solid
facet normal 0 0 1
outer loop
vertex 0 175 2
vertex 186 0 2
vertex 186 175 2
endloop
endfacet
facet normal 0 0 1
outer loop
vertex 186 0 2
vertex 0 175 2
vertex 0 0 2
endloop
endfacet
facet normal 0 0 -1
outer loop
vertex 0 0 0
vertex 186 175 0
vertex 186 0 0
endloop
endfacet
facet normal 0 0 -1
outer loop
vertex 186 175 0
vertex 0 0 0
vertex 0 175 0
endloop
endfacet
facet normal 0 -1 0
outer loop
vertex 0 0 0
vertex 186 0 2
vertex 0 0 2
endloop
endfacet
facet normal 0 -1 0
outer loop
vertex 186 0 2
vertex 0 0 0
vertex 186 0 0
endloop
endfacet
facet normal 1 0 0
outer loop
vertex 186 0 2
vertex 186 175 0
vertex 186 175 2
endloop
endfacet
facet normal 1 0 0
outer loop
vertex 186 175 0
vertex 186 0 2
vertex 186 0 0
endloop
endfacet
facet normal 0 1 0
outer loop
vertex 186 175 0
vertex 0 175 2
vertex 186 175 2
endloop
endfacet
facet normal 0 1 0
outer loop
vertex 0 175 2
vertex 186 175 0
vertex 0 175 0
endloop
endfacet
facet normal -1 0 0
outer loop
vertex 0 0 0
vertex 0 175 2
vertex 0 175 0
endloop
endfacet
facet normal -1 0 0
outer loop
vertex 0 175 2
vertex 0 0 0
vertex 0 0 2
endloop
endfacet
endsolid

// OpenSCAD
/* This piece was designed by Shawn French (McMaster University, Ontario, Canada)
It is part of the SCIFIcube (SCIentific Fluorescence Imaging cube), a small and portable 3D-printed
fluorescence imager for bacteria, yeast, or any colony-forming organism.  It works well with solid
agar medium, and can image high density samples rapidly over time.  

Details can be found at https://www.github.com/sfrench007/scificube

Copyright 2017 McMaster University

Redistribution and use in source and binary forms, with or without modification, are permitted provided that the following conditions are met:

1. Redistributions of source code must retain the above copyright notice, this list of conditions and the following disclaimer.

2. Redistributions in binary form must reproduce the above copyright notice, this list of conditions and the following disclaimer in the documentation and/or other materials provided with the distribution.

3. Neither the name of the copyright holder nor the names of its contributors may be used to endorse or promote products derived from this software without specific prior written permission.

THIS SOFTWARE IS PROVIDED BY THE COPYRIGHT HOLDERS AND CONTRIBUTORS "AS IS" AND ANY EXPRESS OR IMPLIED WARRANTIES, INCLUDING, BUT NOT LIMITED TO, THE IMPLIED WARRANTIES OF MERCHANTABILITY AND FITNESS FOR A PARTICULAR PURPOSE ARE DISCLAIMED. IN NO EVENT SHALL THE COPYRIGHT HOLDER OR CONTRIBUTORS BE LIABLE FOR ANY DIRECT, INDIRECT, INCIDENTAL, SPECIAL, EXEMPLARY, OR CONSEQUENTIAL DAMAGES (INCLUDING, BUT NOT LIMITED TO, PROCUREMENT OF SUBSTITUTE GOODS OR SERVICES; LOSS OF USE, DATA, OR PROFITS; OR BUSINESS INTERRUPTION) HOWEVER CAUSED AND ON ANY THEORY OF LIABILITY, WHETHER IN CONTRACT, STRICT LIABILITY, OR TORT (INCLUDING NEGLIGENCE OR OTHERWISE) ARISING IN ANY WAY OUT OF THE USE OF THIS SOFTWARE, EVEN IF ADVISED OF THE POSSIBILITY OF SUCH DAMAGE.

*/

// Height 175 mm (camera to base)
// Width 157 mm
// Depth 134 mm
// 135 mm camera to top of transilluminator
// 40 mm transilluminator height (base height)

boardWidth = 147;
boardDepth = 115;
boardHeight = 2;
acWidth = 11.5;
acHeight = 9;
acOffset = 5;
acRad = (acHeight/2)+1;
switchWidth = 11;
switchHeight = 7;
switchOffset = 3.5;

transDepth = 126.5;
transWidth = 157.5;
transHeight = 40;
transWallWidth = (transWidth-boardWidth)/2;

rigWallWidth = 3;
rigHeight = 175;
rigWidth = transWidth + (rigWallWidth * 2);
rigDepth = transDepth + (rigWallWidth * 2);
echo(rigWidth);
echo(rigDepth);
riserHeight = 4.8;
riserWidth = 10;

railWidth = 20;
sideWallWidth = 2;
allowance = 1;
slitDepth = 10;

cube(size=[186,rigHeight,sideWallWidth],center=false);
